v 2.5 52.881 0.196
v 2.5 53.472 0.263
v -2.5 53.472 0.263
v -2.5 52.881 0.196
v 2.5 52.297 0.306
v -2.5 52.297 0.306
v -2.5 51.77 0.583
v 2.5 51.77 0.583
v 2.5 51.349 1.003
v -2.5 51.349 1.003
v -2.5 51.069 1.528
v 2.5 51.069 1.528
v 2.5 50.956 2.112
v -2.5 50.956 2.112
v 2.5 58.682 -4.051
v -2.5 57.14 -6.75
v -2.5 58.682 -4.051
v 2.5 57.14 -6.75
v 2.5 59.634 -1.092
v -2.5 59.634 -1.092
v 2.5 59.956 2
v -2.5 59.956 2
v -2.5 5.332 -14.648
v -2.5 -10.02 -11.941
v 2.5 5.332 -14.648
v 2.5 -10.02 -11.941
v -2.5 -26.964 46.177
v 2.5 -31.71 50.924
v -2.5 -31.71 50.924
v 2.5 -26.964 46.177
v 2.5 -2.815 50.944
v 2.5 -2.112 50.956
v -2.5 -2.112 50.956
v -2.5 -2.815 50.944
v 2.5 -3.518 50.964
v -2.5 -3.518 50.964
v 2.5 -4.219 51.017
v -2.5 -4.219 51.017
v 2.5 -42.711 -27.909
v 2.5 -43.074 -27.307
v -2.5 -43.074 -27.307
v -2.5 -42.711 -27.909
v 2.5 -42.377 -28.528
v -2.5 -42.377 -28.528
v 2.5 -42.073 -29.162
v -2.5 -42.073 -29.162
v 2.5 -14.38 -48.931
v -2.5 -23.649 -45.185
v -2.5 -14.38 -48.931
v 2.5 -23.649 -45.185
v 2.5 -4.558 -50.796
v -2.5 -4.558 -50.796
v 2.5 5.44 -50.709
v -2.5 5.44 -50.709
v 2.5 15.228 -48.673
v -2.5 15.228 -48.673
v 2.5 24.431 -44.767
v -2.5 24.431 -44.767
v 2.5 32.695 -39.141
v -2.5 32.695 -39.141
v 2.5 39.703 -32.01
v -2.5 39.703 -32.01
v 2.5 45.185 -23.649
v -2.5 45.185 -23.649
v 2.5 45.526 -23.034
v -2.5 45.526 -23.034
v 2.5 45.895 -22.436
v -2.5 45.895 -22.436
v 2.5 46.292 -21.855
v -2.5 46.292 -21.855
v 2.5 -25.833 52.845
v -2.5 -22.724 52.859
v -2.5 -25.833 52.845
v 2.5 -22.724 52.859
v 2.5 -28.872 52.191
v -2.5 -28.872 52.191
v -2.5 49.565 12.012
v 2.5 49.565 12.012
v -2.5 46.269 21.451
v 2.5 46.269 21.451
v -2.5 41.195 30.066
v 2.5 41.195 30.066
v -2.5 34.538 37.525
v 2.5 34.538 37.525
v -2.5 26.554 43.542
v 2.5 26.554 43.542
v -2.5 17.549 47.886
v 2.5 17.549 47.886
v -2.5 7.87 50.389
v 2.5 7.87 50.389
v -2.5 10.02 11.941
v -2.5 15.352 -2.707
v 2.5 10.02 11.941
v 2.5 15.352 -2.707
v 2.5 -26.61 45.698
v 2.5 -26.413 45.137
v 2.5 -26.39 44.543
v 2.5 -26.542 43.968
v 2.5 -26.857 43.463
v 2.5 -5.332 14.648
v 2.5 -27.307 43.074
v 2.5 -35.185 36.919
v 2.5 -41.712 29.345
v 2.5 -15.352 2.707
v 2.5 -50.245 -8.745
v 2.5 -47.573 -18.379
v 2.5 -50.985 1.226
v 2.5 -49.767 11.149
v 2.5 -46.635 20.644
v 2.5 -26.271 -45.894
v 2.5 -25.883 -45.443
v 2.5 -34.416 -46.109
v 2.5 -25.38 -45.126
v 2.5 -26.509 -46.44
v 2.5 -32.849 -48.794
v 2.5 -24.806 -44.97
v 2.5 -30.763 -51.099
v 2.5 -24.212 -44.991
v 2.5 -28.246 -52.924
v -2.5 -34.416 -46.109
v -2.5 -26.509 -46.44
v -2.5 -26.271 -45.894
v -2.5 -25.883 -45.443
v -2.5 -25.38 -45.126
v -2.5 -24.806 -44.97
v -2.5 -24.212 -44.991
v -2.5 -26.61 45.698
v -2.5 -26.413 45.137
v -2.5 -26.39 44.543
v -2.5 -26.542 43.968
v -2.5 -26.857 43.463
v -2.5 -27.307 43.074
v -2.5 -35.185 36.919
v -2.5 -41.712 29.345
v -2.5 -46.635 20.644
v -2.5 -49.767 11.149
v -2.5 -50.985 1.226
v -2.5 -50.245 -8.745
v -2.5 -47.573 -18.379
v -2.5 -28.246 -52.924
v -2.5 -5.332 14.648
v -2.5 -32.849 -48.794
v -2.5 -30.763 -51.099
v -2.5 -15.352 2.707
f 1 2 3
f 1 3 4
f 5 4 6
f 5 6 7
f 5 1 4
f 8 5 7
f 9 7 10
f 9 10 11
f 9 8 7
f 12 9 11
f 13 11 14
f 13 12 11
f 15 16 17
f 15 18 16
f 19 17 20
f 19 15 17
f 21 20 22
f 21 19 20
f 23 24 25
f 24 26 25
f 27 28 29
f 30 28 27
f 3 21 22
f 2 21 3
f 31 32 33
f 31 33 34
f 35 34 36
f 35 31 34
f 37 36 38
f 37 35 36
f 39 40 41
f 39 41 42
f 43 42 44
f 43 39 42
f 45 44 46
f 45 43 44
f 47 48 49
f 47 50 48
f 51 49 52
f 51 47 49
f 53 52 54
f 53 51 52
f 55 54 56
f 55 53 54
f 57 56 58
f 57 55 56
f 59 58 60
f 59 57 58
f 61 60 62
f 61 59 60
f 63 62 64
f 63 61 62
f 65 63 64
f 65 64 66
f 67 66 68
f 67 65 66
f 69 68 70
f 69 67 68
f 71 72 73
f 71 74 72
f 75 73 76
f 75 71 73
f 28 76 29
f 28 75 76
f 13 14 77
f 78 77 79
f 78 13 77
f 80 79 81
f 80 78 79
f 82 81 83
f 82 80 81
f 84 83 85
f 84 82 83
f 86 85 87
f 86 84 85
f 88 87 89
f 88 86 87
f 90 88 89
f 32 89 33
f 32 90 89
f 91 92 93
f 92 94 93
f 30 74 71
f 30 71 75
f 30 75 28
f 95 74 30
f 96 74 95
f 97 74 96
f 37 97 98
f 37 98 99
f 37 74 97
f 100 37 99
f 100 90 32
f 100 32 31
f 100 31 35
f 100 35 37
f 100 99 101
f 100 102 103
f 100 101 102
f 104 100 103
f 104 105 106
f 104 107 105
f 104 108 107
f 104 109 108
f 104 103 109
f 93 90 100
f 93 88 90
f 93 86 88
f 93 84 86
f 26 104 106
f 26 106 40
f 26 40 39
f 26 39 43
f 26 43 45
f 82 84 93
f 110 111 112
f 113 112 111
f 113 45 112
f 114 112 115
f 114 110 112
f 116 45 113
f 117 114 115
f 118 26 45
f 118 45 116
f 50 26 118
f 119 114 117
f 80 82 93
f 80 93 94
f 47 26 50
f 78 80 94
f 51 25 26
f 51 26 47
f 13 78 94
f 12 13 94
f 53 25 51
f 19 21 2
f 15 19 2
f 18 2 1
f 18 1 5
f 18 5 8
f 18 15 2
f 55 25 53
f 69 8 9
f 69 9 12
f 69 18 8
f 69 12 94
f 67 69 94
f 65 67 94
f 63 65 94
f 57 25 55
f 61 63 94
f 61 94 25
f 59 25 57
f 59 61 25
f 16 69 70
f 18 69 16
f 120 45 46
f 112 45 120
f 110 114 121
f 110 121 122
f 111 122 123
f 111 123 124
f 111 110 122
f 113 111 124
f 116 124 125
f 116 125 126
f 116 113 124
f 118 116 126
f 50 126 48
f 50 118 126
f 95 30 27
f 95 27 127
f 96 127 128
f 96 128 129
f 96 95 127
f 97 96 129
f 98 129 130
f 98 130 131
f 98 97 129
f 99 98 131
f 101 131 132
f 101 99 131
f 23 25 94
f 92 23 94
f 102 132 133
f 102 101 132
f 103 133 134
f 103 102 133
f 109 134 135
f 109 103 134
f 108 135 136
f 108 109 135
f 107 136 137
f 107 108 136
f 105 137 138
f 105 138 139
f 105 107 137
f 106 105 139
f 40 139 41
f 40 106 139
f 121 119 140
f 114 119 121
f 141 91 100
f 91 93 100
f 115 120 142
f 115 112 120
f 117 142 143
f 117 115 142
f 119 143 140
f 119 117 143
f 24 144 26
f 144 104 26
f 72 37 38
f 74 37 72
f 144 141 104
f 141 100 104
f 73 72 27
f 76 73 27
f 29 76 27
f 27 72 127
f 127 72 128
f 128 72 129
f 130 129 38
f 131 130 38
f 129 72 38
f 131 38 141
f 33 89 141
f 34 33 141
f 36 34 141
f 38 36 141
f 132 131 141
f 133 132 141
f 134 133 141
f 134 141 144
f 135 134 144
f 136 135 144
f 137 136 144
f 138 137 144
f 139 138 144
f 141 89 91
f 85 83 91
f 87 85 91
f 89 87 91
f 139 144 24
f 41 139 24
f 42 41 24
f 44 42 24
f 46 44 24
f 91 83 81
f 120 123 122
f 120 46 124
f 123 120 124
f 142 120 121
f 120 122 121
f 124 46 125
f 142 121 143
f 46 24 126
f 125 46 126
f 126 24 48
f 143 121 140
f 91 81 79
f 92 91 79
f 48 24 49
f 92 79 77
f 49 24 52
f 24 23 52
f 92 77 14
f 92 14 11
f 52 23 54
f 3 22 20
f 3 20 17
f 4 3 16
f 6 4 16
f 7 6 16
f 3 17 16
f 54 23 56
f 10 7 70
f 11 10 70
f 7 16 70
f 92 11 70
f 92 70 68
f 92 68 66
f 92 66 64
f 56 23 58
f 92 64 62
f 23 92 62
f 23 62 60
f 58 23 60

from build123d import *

# Parameters (mm, degrees)
SKETCH1_R         = 51
EXTRUDE1_DEPTH    = 2.5
EXTRUDE2_DEPTH    = 2.5
CIRPATTERN1_COUNT = 3


with BuildPart() as part:
    # Sketch1 → Extrude1 (new, symmetric)
    with BuildSketch(Plane(origin=(0, 0, 0), x_dir=(0, 0, -1), z_dir=(1, 0, 0))):
        Circle(SKETCH1_R)
        Polygon((14.648358264, 5.331566389), (2.706907197, 15.351633575), (-11.941451067, 10.020067186), (-14.648358264, -5.331566389), (-2.706907197, -15.351633575), (11.941451067, -10.020067186), align=None, mode=Mode.SUBTRACT)
    extrude(amount=EXTRUDE1_DEPTH, both=True)

    # Sketch2 → Extrude2 (add, symmetric)
    with BuildSketch(Plane(origin=(0, 0, 0), x_dir=(0, 0, -1), z_dir=(1, 0, 0))):
        with BuildLine():
            Line((-2, 59.956265369), (-0.262596806, 53.472188376))
            ThreePointArc((-0.262596806, 53.472188376), (-0.582870999, 51.770144067), (-2.111639083, 50.956265369))
            ThreePointArc((-2.111639083, 50.956265369), (11.148765219, 49.766505142), (23.649399595, 45.185239833))
            ThreePointArc((23.649399595, 45.185239833), (22.732801751, 45.706819988), (21.855117489, 46.291514612))
            Line((21.855117489, 46.291514612), (6.74998787, 57.139767012))
            ThreePointArc((6.74998787, 57.139767012), (2.596056753, 59.234789884), (-2, 59.956265369))
        make_face()
    extrude2 = extrude(amount=EXTRUDE2_DEPTH, both=True)

    # CirPattern1: Extrude2 ×3 about axis
    cirpattern1_axis = Axis((-5.5, 0, 0), (1, 0, 0))
    for i in range(1, CIRPATTERN1_COUNT):
        add(extrude2.rotate(cirpattern1_axis, i * 360 / CIRPATTERN1_COUNT))


solid = part.part
